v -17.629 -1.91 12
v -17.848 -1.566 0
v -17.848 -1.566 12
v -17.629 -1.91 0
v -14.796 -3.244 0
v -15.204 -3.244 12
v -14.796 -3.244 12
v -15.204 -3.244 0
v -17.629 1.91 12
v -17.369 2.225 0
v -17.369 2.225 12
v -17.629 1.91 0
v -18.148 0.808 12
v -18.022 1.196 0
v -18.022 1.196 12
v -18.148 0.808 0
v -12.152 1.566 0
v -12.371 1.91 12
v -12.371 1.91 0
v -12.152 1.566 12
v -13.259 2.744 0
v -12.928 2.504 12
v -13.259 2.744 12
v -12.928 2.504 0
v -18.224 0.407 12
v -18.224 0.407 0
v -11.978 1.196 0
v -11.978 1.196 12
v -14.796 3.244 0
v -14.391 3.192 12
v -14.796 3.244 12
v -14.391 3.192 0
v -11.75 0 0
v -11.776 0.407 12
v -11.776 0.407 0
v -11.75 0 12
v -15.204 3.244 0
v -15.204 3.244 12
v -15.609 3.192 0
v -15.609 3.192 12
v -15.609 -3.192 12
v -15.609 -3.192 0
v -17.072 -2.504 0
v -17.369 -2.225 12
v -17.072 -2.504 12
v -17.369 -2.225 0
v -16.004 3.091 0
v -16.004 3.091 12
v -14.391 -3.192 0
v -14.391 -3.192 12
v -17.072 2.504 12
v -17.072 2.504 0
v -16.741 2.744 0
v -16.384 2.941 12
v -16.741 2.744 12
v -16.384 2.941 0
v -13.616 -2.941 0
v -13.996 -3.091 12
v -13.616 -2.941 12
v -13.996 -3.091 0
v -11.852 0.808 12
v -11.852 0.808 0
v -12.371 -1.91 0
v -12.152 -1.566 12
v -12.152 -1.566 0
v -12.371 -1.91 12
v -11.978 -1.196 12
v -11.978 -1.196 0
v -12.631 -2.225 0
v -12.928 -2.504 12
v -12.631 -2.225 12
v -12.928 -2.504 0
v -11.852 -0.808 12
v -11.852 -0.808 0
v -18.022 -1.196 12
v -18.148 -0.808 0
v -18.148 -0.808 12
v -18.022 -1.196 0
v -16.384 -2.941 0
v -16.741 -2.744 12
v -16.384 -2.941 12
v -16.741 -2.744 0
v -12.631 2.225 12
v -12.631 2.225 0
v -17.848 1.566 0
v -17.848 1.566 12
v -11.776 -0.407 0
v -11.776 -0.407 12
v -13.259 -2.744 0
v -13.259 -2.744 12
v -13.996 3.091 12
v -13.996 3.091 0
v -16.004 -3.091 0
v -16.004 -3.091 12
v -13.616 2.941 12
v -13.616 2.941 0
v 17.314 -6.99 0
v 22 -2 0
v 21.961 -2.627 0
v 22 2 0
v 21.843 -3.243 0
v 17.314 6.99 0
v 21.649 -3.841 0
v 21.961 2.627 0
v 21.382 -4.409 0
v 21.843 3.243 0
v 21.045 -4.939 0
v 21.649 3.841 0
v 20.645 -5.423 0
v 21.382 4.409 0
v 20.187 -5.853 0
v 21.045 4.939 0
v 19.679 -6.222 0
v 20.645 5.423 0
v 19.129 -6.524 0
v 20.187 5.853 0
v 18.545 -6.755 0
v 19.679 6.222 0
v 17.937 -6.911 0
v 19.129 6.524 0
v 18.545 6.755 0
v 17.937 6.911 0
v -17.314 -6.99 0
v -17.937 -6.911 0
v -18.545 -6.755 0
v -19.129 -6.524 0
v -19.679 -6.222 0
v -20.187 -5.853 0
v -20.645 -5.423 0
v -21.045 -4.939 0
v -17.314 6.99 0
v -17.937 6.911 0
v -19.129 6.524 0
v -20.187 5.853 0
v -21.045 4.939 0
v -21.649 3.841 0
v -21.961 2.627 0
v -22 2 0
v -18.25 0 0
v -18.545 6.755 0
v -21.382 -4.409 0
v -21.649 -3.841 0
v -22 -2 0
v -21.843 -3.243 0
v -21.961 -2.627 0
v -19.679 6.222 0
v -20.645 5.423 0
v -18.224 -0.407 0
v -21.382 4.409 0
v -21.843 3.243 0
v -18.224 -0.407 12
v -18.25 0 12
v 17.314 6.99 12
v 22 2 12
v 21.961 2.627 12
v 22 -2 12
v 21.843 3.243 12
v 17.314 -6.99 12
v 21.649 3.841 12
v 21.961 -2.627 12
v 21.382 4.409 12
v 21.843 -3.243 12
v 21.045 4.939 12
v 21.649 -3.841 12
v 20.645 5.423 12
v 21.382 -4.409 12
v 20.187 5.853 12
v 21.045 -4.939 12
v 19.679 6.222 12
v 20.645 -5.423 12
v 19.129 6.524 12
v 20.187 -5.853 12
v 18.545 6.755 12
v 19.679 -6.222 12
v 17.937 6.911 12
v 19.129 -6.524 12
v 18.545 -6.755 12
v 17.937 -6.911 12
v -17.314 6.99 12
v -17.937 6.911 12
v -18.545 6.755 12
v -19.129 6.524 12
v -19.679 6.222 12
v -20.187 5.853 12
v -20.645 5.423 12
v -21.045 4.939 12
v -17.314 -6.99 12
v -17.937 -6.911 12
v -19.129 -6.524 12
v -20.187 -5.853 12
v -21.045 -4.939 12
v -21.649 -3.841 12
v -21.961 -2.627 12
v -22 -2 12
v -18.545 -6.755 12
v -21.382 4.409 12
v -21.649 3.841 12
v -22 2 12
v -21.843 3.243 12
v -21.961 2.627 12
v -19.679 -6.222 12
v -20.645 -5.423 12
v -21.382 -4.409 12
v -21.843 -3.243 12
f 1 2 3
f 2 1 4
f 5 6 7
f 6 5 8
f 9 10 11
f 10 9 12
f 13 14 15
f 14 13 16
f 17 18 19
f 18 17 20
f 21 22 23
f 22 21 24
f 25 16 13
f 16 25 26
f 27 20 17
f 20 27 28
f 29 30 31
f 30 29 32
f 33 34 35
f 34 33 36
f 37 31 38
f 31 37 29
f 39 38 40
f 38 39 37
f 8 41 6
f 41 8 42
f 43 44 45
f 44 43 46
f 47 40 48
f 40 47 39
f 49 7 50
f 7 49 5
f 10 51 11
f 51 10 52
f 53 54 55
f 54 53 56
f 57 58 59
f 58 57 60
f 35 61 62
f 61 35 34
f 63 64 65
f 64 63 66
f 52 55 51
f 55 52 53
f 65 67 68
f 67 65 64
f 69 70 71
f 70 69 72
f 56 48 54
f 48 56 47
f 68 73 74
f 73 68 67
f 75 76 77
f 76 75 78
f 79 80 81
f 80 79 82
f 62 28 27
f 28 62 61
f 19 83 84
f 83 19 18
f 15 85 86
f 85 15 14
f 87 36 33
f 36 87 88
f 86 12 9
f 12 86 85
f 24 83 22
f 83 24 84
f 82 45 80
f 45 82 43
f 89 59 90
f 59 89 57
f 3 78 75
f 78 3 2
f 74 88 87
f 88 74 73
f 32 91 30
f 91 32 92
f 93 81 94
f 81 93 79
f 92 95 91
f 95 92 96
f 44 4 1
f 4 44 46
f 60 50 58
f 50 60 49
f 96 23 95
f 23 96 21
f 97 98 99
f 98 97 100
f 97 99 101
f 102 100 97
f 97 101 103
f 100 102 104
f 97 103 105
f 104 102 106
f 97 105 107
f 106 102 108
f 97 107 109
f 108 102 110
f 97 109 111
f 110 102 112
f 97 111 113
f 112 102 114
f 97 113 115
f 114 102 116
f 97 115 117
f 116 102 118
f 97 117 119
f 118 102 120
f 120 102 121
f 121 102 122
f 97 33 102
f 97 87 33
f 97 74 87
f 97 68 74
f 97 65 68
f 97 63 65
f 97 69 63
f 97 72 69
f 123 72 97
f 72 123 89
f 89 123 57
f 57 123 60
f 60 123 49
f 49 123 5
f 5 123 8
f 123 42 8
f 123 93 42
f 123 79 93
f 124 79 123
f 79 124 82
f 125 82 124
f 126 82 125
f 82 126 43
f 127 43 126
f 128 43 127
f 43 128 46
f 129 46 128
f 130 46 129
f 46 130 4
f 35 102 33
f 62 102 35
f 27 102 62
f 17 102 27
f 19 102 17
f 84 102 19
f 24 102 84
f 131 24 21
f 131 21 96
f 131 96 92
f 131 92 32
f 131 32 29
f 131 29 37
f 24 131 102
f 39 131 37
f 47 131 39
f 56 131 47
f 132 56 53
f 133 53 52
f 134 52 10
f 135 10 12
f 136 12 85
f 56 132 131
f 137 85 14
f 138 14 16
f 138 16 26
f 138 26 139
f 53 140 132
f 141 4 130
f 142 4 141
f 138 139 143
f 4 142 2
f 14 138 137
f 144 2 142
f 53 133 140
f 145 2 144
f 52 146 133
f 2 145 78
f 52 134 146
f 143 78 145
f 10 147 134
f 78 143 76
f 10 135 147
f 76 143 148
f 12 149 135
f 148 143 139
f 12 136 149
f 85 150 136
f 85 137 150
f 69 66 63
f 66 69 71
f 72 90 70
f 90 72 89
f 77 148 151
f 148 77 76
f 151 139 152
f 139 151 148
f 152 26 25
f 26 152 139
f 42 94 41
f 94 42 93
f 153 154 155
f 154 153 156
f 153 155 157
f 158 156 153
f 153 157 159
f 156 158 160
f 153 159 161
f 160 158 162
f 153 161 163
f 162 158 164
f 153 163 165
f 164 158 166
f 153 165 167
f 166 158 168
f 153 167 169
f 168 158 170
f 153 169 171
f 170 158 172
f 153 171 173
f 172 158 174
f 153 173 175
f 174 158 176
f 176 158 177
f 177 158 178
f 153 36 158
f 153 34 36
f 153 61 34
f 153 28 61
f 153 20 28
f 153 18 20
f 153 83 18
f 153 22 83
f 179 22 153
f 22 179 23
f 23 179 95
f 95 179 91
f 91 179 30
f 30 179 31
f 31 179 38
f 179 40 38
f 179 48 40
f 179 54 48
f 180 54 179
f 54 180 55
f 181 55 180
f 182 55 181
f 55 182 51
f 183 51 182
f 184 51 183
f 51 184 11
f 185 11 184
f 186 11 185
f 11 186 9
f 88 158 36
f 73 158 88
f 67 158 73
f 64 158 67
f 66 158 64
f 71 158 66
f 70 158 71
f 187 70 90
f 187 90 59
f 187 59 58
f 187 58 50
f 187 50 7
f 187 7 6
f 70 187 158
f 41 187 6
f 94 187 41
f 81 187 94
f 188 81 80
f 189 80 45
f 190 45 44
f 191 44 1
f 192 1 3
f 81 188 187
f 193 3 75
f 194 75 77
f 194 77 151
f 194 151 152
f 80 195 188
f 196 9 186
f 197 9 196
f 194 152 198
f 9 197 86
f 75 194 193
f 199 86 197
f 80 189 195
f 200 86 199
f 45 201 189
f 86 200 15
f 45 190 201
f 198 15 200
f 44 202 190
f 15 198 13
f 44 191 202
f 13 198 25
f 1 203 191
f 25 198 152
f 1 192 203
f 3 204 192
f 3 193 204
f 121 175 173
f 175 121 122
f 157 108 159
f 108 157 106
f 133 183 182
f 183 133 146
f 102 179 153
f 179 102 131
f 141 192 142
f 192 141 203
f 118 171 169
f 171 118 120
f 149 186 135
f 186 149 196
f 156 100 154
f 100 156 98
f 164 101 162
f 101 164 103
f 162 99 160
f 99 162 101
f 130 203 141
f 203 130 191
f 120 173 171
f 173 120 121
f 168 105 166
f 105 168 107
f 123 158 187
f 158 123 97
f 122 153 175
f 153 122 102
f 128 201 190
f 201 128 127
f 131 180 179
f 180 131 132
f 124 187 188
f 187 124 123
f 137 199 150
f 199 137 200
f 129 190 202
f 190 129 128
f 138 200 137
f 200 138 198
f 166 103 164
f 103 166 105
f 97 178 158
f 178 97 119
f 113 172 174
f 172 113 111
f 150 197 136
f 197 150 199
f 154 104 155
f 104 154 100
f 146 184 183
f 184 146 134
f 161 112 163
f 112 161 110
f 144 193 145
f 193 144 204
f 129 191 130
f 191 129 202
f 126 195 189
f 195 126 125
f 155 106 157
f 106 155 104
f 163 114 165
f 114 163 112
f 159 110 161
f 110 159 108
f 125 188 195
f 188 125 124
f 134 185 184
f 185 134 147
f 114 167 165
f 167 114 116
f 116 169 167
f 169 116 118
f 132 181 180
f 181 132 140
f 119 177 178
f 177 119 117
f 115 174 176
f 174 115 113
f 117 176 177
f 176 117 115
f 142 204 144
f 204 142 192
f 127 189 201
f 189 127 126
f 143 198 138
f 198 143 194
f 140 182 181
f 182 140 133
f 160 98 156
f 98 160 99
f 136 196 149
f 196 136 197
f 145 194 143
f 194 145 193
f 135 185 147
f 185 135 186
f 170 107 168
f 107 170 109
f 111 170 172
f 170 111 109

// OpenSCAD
$fn = 50;


difference() {
	union() {
		hull() {
			translate(v = [-17.0000000000, 2.0000000000, 0]) {
				cylinder(h = 12, r = 5);
			}
			translate(v = [17.0000000000, 2.0000000000, 0]) {
				cylinder(h = 12, r = 5);
			}
			translate(v = [-17.0000000000, -2.0000000000, 0]) {
				cylinder(h = 12, r = 5);
			}
			translate(v = [17.0000000000, -2.0000000000, 0]) {
				cylinder(h = 12, r = 5);
			}
		}
	}
	union() {
		translate(v = [-15.0000000000, 0.0000000000, 0]) {
			cylinder(h = 12, r = 3.2500000000);
		}
		translate(v = [-15.0000000000, 0.0000000000, 0]) {
			cylinder(h = 12, r = 1.8000000000);
		}
		translate(v = [-15.0000000000, 0.0000000000, 0]) {
			cylinder(h = 12, r = 1.8000000000);
		}
		translate(v = [-15.0000000000, 0.0000000000, 0]) {
			cylinder(h = 12, r = 1.8000000000);
		}
	}
}
